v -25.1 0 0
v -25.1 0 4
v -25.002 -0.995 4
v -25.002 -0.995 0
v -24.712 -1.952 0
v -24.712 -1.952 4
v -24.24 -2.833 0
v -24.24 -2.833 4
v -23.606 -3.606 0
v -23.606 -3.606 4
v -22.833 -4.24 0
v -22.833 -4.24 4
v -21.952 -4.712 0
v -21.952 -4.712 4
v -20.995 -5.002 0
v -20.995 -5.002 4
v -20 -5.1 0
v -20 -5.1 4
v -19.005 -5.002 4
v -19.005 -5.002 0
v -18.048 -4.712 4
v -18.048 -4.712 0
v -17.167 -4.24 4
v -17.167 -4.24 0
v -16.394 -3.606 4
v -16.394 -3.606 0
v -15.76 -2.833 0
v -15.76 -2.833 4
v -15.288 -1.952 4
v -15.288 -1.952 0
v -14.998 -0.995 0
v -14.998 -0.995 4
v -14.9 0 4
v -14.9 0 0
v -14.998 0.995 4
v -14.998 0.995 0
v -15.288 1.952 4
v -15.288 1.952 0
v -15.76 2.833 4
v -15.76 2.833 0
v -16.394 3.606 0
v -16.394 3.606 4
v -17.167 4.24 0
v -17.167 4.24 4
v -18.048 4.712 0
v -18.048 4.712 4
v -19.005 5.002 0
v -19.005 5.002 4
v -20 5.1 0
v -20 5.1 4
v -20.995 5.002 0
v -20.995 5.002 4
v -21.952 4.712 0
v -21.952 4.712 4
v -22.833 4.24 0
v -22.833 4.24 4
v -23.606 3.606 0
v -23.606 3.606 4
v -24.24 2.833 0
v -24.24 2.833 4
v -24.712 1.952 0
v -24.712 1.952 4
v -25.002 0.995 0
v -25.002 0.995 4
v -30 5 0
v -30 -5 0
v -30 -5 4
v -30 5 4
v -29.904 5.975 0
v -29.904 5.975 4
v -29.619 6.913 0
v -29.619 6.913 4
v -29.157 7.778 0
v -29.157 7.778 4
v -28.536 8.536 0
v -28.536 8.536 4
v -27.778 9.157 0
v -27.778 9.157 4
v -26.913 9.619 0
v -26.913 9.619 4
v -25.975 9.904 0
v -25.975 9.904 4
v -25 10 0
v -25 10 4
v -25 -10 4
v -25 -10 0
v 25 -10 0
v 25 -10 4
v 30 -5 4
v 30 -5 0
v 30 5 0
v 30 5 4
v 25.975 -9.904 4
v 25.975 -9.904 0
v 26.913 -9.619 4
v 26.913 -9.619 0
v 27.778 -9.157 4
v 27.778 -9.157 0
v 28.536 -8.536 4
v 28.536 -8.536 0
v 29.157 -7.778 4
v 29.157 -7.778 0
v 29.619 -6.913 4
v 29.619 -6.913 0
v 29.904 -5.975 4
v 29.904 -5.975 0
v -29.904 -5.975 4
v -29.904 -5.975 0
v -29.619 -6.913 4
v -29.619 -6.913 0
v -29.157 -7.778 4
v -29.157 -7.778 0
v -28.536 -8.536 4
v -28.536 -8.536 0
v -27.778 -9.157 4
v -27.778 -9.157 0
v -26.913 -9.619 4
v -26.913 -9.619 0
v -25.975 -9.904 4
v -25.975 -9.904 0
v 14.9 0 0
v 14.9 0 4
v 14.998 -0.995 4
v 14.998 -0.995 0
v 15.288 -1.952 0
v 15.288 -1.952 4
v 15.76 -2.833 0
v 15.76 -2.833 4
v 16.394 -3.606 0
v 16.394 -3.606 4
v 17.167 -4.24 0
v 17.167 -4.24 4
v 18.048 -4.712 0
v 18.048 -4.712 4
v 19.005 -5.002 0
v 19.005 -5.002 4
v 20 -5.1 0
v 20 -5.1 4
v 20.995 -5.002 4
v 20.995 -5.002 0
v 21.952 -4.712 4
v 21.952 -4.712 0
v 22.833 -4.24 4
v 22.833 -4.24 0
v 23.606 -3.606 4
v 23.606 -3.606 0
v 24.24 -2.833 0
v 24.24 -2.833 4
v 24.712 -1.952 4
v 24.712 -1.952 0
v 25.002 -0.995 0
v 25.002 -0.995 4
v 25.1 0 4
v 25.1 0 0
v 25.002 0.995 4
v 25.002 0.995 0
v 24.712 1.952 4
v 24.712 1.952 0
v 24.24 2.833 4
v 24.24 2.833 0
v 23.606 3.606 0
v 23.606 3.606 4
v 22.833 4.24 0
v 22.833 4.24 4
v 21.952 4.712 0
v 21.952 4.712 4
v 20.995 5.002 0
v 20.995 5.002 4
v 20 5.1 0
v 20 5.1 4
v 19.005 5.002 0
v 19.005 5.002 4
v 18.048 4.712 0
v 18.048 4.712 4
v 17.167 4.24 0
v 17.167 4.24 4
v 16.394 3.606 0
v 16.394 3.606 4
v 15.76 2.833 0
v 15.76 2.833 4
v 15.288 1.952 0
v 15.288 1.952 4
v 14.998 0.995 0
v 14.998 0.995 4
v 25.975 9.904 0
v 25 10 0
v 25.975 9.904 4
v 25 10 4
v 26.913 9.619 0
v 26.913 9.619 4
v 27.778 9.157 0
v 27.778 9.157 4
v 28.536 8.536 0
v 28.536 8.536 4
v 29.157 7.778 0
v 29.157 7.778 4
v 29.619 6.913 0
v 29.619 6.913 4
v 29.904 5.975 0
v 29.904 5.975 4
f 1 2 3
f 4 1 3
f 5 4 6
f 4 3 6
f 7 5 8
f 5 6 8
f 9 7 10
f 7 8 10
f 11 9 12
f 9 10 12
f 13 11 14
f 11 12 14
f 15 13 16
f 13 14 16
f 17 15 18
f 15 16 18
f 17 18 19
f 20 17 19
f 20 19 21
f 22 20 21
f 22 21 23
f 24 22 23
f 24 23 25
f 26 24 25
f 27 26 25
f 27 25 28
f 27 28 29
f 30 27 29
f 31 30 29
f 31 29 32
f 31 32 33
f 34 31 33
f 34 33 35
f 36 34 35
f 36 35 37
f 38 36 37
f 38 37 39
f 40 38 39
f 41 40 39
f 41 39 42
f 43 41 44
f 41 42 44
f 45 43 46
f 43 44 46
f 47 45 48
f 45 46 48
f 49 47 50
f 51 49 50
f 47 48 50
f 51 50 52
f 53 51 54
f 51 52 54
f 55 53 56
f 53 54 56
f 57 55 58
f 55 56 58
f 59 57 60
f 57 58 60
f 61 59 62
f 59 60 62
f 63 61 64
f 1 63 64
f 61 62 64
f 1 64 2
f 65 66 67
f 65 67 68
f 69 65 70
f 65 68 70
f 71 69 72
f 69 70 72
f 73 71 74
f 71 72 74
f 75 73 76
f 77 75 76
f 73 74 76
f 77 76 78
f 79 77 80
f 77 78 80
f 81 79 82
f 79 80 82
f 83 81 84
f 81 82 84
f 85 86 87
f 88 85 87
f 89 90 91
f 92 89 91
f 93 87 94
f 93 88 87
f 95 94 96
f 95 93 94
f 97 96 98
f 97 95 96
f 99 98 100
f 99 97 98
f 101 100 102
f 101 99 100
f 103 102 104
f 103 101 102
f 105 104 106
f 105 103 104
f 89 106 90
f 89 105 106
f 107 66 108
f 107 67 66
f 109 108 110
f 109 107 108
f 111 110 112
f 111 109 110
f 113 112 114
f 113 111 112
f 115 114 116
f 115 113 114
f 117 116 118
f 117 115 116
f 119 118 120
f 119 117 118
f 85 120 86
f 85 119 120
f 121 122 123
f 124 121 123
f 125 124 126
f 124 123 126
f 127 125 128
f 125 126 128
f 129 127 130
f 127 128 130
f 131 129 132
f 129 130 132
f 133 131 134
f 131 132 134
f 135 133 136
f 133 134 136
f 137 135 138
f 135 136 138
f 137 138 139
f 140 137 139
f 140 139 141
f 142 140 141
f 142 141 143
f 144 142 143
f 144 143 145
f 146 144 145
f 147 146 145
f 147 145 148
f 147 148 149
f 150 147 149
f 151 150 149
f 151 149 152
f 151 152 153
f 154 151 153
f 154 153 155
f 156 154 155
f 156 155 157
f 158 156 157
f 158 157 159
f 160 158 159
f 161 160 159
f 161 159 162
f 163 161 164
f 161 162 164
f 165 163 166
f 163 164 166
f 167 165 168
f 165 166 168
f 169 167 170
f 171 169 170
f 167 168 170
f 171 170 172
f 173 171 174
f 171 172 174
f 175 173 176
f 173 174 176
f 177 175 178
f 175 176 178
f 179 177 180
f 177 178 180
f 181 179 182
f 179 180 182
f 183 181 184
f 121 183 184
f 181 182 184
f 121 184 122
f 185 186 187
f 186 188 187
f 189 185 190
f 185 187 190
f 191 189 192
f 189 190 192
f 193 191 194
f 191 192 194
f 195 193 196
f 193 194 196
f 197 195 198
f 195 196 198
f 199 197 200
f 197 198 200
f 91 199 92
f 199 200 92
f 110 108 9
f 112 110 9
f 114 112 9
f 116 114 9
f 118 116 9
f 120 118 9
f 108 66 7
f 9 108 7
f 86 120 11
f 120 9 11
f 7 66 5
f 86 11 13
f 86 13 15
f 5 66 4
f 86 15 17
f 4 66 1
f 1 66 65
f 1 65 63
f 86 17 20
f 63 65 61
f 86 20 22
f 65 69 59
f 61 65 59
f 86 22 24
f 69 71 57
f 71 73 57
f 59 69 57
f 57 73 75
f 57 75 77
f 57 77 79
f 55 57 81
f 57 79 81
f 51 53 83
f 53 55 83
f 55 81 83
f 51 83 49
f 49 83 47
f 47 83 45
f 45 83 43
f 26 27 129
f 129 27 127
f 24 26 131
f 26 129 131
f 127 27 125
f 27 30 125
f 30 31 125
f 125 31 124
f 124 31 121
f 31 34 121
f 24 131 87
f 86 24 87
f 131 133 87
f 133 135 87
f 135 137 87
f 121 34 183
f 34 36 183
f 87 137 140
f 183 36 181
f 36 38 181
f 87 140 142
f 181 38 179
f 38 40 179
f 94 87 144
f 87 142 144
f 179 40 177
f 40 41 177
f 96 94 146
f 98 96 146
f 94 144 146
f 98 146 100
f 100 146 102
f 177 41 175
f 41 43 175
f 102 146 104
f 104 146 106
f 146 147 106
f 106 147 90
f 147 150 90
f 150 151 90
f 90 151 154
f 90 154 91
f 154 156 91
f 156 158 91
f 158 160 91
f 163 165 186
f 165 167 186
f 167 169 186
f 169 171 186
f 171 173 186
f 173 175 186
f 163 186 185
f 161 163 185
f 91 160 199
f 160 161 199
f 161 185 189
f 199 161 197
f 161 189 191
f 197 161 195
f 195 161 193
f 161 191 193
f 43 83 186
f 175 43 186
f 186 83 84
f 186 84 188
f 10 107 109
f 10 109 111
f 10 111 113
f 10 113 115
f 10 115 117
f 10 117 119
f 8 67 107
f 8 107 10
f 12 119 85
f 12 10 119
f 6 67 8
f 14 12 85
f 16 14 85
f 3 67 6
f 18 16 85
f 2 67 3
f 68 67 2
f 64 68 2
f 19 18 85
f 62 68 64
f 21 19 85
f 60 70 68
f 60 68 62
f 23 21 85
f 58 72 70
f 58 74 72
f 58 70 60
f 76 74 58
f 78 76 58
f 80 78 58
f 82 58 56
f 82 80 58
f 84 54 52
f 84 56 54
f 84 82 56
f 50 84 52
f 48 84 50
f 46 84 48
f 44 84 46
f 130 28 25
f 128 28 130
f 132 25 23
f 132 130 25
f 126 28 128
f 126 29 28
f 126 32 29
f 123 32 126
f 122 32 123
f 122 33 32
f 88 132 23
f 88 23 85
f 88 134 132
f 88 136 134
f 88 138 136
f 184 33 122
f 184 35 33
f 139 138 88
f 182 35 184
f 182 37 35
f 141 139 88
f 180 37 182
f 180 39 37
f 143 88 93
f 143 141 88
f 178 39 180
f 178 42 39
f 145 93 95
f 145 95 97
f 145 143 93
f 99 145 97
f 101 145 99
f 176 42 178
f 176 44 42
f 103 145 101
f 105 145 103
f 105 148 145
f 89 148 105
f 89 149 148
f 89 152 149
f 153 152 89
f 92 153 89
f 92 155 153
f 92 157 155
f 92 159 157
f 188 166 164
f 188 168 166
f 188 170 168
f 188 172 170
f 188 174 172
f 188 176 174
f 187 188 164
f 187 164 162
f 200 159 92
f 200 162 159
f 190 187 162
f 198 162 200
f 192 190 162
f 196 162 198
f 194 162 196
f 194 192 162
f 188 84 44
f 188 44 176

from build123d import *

# Parameters (mm, degrees)
F0_W     = 60
F0_H     = 20
F1_DEPTH = 4
F2_D     = 10.2
F3_R     = 5


with BuildPart() as f1:
    # F0 (on Top) → F1 (new body)
    with BuildSketch(Plane.XY):
        Rectangle(F0_W, F0_H)
    extrude(amount=F1_DEPTH)

    # F2 (through all)
    with Locations(Plane(origin=(0, 0, 0), x_dir=(1, 0, 0), z_dir=(0, 0, -1))):
        with Locations((-20, 0), (20, 0)):
            Hole(F2_D / 2)

    # F3
    f3_edges = [f1.edges().sort_by_distance(p)[0] for p in [
        (-30, 10, 2),
        (-30, -10, 2),
        (30, 10, 2),
        (30, -10, 2),
    ]]
    fillet(f3_edges, radius=F3_R)


solid = f1.part
